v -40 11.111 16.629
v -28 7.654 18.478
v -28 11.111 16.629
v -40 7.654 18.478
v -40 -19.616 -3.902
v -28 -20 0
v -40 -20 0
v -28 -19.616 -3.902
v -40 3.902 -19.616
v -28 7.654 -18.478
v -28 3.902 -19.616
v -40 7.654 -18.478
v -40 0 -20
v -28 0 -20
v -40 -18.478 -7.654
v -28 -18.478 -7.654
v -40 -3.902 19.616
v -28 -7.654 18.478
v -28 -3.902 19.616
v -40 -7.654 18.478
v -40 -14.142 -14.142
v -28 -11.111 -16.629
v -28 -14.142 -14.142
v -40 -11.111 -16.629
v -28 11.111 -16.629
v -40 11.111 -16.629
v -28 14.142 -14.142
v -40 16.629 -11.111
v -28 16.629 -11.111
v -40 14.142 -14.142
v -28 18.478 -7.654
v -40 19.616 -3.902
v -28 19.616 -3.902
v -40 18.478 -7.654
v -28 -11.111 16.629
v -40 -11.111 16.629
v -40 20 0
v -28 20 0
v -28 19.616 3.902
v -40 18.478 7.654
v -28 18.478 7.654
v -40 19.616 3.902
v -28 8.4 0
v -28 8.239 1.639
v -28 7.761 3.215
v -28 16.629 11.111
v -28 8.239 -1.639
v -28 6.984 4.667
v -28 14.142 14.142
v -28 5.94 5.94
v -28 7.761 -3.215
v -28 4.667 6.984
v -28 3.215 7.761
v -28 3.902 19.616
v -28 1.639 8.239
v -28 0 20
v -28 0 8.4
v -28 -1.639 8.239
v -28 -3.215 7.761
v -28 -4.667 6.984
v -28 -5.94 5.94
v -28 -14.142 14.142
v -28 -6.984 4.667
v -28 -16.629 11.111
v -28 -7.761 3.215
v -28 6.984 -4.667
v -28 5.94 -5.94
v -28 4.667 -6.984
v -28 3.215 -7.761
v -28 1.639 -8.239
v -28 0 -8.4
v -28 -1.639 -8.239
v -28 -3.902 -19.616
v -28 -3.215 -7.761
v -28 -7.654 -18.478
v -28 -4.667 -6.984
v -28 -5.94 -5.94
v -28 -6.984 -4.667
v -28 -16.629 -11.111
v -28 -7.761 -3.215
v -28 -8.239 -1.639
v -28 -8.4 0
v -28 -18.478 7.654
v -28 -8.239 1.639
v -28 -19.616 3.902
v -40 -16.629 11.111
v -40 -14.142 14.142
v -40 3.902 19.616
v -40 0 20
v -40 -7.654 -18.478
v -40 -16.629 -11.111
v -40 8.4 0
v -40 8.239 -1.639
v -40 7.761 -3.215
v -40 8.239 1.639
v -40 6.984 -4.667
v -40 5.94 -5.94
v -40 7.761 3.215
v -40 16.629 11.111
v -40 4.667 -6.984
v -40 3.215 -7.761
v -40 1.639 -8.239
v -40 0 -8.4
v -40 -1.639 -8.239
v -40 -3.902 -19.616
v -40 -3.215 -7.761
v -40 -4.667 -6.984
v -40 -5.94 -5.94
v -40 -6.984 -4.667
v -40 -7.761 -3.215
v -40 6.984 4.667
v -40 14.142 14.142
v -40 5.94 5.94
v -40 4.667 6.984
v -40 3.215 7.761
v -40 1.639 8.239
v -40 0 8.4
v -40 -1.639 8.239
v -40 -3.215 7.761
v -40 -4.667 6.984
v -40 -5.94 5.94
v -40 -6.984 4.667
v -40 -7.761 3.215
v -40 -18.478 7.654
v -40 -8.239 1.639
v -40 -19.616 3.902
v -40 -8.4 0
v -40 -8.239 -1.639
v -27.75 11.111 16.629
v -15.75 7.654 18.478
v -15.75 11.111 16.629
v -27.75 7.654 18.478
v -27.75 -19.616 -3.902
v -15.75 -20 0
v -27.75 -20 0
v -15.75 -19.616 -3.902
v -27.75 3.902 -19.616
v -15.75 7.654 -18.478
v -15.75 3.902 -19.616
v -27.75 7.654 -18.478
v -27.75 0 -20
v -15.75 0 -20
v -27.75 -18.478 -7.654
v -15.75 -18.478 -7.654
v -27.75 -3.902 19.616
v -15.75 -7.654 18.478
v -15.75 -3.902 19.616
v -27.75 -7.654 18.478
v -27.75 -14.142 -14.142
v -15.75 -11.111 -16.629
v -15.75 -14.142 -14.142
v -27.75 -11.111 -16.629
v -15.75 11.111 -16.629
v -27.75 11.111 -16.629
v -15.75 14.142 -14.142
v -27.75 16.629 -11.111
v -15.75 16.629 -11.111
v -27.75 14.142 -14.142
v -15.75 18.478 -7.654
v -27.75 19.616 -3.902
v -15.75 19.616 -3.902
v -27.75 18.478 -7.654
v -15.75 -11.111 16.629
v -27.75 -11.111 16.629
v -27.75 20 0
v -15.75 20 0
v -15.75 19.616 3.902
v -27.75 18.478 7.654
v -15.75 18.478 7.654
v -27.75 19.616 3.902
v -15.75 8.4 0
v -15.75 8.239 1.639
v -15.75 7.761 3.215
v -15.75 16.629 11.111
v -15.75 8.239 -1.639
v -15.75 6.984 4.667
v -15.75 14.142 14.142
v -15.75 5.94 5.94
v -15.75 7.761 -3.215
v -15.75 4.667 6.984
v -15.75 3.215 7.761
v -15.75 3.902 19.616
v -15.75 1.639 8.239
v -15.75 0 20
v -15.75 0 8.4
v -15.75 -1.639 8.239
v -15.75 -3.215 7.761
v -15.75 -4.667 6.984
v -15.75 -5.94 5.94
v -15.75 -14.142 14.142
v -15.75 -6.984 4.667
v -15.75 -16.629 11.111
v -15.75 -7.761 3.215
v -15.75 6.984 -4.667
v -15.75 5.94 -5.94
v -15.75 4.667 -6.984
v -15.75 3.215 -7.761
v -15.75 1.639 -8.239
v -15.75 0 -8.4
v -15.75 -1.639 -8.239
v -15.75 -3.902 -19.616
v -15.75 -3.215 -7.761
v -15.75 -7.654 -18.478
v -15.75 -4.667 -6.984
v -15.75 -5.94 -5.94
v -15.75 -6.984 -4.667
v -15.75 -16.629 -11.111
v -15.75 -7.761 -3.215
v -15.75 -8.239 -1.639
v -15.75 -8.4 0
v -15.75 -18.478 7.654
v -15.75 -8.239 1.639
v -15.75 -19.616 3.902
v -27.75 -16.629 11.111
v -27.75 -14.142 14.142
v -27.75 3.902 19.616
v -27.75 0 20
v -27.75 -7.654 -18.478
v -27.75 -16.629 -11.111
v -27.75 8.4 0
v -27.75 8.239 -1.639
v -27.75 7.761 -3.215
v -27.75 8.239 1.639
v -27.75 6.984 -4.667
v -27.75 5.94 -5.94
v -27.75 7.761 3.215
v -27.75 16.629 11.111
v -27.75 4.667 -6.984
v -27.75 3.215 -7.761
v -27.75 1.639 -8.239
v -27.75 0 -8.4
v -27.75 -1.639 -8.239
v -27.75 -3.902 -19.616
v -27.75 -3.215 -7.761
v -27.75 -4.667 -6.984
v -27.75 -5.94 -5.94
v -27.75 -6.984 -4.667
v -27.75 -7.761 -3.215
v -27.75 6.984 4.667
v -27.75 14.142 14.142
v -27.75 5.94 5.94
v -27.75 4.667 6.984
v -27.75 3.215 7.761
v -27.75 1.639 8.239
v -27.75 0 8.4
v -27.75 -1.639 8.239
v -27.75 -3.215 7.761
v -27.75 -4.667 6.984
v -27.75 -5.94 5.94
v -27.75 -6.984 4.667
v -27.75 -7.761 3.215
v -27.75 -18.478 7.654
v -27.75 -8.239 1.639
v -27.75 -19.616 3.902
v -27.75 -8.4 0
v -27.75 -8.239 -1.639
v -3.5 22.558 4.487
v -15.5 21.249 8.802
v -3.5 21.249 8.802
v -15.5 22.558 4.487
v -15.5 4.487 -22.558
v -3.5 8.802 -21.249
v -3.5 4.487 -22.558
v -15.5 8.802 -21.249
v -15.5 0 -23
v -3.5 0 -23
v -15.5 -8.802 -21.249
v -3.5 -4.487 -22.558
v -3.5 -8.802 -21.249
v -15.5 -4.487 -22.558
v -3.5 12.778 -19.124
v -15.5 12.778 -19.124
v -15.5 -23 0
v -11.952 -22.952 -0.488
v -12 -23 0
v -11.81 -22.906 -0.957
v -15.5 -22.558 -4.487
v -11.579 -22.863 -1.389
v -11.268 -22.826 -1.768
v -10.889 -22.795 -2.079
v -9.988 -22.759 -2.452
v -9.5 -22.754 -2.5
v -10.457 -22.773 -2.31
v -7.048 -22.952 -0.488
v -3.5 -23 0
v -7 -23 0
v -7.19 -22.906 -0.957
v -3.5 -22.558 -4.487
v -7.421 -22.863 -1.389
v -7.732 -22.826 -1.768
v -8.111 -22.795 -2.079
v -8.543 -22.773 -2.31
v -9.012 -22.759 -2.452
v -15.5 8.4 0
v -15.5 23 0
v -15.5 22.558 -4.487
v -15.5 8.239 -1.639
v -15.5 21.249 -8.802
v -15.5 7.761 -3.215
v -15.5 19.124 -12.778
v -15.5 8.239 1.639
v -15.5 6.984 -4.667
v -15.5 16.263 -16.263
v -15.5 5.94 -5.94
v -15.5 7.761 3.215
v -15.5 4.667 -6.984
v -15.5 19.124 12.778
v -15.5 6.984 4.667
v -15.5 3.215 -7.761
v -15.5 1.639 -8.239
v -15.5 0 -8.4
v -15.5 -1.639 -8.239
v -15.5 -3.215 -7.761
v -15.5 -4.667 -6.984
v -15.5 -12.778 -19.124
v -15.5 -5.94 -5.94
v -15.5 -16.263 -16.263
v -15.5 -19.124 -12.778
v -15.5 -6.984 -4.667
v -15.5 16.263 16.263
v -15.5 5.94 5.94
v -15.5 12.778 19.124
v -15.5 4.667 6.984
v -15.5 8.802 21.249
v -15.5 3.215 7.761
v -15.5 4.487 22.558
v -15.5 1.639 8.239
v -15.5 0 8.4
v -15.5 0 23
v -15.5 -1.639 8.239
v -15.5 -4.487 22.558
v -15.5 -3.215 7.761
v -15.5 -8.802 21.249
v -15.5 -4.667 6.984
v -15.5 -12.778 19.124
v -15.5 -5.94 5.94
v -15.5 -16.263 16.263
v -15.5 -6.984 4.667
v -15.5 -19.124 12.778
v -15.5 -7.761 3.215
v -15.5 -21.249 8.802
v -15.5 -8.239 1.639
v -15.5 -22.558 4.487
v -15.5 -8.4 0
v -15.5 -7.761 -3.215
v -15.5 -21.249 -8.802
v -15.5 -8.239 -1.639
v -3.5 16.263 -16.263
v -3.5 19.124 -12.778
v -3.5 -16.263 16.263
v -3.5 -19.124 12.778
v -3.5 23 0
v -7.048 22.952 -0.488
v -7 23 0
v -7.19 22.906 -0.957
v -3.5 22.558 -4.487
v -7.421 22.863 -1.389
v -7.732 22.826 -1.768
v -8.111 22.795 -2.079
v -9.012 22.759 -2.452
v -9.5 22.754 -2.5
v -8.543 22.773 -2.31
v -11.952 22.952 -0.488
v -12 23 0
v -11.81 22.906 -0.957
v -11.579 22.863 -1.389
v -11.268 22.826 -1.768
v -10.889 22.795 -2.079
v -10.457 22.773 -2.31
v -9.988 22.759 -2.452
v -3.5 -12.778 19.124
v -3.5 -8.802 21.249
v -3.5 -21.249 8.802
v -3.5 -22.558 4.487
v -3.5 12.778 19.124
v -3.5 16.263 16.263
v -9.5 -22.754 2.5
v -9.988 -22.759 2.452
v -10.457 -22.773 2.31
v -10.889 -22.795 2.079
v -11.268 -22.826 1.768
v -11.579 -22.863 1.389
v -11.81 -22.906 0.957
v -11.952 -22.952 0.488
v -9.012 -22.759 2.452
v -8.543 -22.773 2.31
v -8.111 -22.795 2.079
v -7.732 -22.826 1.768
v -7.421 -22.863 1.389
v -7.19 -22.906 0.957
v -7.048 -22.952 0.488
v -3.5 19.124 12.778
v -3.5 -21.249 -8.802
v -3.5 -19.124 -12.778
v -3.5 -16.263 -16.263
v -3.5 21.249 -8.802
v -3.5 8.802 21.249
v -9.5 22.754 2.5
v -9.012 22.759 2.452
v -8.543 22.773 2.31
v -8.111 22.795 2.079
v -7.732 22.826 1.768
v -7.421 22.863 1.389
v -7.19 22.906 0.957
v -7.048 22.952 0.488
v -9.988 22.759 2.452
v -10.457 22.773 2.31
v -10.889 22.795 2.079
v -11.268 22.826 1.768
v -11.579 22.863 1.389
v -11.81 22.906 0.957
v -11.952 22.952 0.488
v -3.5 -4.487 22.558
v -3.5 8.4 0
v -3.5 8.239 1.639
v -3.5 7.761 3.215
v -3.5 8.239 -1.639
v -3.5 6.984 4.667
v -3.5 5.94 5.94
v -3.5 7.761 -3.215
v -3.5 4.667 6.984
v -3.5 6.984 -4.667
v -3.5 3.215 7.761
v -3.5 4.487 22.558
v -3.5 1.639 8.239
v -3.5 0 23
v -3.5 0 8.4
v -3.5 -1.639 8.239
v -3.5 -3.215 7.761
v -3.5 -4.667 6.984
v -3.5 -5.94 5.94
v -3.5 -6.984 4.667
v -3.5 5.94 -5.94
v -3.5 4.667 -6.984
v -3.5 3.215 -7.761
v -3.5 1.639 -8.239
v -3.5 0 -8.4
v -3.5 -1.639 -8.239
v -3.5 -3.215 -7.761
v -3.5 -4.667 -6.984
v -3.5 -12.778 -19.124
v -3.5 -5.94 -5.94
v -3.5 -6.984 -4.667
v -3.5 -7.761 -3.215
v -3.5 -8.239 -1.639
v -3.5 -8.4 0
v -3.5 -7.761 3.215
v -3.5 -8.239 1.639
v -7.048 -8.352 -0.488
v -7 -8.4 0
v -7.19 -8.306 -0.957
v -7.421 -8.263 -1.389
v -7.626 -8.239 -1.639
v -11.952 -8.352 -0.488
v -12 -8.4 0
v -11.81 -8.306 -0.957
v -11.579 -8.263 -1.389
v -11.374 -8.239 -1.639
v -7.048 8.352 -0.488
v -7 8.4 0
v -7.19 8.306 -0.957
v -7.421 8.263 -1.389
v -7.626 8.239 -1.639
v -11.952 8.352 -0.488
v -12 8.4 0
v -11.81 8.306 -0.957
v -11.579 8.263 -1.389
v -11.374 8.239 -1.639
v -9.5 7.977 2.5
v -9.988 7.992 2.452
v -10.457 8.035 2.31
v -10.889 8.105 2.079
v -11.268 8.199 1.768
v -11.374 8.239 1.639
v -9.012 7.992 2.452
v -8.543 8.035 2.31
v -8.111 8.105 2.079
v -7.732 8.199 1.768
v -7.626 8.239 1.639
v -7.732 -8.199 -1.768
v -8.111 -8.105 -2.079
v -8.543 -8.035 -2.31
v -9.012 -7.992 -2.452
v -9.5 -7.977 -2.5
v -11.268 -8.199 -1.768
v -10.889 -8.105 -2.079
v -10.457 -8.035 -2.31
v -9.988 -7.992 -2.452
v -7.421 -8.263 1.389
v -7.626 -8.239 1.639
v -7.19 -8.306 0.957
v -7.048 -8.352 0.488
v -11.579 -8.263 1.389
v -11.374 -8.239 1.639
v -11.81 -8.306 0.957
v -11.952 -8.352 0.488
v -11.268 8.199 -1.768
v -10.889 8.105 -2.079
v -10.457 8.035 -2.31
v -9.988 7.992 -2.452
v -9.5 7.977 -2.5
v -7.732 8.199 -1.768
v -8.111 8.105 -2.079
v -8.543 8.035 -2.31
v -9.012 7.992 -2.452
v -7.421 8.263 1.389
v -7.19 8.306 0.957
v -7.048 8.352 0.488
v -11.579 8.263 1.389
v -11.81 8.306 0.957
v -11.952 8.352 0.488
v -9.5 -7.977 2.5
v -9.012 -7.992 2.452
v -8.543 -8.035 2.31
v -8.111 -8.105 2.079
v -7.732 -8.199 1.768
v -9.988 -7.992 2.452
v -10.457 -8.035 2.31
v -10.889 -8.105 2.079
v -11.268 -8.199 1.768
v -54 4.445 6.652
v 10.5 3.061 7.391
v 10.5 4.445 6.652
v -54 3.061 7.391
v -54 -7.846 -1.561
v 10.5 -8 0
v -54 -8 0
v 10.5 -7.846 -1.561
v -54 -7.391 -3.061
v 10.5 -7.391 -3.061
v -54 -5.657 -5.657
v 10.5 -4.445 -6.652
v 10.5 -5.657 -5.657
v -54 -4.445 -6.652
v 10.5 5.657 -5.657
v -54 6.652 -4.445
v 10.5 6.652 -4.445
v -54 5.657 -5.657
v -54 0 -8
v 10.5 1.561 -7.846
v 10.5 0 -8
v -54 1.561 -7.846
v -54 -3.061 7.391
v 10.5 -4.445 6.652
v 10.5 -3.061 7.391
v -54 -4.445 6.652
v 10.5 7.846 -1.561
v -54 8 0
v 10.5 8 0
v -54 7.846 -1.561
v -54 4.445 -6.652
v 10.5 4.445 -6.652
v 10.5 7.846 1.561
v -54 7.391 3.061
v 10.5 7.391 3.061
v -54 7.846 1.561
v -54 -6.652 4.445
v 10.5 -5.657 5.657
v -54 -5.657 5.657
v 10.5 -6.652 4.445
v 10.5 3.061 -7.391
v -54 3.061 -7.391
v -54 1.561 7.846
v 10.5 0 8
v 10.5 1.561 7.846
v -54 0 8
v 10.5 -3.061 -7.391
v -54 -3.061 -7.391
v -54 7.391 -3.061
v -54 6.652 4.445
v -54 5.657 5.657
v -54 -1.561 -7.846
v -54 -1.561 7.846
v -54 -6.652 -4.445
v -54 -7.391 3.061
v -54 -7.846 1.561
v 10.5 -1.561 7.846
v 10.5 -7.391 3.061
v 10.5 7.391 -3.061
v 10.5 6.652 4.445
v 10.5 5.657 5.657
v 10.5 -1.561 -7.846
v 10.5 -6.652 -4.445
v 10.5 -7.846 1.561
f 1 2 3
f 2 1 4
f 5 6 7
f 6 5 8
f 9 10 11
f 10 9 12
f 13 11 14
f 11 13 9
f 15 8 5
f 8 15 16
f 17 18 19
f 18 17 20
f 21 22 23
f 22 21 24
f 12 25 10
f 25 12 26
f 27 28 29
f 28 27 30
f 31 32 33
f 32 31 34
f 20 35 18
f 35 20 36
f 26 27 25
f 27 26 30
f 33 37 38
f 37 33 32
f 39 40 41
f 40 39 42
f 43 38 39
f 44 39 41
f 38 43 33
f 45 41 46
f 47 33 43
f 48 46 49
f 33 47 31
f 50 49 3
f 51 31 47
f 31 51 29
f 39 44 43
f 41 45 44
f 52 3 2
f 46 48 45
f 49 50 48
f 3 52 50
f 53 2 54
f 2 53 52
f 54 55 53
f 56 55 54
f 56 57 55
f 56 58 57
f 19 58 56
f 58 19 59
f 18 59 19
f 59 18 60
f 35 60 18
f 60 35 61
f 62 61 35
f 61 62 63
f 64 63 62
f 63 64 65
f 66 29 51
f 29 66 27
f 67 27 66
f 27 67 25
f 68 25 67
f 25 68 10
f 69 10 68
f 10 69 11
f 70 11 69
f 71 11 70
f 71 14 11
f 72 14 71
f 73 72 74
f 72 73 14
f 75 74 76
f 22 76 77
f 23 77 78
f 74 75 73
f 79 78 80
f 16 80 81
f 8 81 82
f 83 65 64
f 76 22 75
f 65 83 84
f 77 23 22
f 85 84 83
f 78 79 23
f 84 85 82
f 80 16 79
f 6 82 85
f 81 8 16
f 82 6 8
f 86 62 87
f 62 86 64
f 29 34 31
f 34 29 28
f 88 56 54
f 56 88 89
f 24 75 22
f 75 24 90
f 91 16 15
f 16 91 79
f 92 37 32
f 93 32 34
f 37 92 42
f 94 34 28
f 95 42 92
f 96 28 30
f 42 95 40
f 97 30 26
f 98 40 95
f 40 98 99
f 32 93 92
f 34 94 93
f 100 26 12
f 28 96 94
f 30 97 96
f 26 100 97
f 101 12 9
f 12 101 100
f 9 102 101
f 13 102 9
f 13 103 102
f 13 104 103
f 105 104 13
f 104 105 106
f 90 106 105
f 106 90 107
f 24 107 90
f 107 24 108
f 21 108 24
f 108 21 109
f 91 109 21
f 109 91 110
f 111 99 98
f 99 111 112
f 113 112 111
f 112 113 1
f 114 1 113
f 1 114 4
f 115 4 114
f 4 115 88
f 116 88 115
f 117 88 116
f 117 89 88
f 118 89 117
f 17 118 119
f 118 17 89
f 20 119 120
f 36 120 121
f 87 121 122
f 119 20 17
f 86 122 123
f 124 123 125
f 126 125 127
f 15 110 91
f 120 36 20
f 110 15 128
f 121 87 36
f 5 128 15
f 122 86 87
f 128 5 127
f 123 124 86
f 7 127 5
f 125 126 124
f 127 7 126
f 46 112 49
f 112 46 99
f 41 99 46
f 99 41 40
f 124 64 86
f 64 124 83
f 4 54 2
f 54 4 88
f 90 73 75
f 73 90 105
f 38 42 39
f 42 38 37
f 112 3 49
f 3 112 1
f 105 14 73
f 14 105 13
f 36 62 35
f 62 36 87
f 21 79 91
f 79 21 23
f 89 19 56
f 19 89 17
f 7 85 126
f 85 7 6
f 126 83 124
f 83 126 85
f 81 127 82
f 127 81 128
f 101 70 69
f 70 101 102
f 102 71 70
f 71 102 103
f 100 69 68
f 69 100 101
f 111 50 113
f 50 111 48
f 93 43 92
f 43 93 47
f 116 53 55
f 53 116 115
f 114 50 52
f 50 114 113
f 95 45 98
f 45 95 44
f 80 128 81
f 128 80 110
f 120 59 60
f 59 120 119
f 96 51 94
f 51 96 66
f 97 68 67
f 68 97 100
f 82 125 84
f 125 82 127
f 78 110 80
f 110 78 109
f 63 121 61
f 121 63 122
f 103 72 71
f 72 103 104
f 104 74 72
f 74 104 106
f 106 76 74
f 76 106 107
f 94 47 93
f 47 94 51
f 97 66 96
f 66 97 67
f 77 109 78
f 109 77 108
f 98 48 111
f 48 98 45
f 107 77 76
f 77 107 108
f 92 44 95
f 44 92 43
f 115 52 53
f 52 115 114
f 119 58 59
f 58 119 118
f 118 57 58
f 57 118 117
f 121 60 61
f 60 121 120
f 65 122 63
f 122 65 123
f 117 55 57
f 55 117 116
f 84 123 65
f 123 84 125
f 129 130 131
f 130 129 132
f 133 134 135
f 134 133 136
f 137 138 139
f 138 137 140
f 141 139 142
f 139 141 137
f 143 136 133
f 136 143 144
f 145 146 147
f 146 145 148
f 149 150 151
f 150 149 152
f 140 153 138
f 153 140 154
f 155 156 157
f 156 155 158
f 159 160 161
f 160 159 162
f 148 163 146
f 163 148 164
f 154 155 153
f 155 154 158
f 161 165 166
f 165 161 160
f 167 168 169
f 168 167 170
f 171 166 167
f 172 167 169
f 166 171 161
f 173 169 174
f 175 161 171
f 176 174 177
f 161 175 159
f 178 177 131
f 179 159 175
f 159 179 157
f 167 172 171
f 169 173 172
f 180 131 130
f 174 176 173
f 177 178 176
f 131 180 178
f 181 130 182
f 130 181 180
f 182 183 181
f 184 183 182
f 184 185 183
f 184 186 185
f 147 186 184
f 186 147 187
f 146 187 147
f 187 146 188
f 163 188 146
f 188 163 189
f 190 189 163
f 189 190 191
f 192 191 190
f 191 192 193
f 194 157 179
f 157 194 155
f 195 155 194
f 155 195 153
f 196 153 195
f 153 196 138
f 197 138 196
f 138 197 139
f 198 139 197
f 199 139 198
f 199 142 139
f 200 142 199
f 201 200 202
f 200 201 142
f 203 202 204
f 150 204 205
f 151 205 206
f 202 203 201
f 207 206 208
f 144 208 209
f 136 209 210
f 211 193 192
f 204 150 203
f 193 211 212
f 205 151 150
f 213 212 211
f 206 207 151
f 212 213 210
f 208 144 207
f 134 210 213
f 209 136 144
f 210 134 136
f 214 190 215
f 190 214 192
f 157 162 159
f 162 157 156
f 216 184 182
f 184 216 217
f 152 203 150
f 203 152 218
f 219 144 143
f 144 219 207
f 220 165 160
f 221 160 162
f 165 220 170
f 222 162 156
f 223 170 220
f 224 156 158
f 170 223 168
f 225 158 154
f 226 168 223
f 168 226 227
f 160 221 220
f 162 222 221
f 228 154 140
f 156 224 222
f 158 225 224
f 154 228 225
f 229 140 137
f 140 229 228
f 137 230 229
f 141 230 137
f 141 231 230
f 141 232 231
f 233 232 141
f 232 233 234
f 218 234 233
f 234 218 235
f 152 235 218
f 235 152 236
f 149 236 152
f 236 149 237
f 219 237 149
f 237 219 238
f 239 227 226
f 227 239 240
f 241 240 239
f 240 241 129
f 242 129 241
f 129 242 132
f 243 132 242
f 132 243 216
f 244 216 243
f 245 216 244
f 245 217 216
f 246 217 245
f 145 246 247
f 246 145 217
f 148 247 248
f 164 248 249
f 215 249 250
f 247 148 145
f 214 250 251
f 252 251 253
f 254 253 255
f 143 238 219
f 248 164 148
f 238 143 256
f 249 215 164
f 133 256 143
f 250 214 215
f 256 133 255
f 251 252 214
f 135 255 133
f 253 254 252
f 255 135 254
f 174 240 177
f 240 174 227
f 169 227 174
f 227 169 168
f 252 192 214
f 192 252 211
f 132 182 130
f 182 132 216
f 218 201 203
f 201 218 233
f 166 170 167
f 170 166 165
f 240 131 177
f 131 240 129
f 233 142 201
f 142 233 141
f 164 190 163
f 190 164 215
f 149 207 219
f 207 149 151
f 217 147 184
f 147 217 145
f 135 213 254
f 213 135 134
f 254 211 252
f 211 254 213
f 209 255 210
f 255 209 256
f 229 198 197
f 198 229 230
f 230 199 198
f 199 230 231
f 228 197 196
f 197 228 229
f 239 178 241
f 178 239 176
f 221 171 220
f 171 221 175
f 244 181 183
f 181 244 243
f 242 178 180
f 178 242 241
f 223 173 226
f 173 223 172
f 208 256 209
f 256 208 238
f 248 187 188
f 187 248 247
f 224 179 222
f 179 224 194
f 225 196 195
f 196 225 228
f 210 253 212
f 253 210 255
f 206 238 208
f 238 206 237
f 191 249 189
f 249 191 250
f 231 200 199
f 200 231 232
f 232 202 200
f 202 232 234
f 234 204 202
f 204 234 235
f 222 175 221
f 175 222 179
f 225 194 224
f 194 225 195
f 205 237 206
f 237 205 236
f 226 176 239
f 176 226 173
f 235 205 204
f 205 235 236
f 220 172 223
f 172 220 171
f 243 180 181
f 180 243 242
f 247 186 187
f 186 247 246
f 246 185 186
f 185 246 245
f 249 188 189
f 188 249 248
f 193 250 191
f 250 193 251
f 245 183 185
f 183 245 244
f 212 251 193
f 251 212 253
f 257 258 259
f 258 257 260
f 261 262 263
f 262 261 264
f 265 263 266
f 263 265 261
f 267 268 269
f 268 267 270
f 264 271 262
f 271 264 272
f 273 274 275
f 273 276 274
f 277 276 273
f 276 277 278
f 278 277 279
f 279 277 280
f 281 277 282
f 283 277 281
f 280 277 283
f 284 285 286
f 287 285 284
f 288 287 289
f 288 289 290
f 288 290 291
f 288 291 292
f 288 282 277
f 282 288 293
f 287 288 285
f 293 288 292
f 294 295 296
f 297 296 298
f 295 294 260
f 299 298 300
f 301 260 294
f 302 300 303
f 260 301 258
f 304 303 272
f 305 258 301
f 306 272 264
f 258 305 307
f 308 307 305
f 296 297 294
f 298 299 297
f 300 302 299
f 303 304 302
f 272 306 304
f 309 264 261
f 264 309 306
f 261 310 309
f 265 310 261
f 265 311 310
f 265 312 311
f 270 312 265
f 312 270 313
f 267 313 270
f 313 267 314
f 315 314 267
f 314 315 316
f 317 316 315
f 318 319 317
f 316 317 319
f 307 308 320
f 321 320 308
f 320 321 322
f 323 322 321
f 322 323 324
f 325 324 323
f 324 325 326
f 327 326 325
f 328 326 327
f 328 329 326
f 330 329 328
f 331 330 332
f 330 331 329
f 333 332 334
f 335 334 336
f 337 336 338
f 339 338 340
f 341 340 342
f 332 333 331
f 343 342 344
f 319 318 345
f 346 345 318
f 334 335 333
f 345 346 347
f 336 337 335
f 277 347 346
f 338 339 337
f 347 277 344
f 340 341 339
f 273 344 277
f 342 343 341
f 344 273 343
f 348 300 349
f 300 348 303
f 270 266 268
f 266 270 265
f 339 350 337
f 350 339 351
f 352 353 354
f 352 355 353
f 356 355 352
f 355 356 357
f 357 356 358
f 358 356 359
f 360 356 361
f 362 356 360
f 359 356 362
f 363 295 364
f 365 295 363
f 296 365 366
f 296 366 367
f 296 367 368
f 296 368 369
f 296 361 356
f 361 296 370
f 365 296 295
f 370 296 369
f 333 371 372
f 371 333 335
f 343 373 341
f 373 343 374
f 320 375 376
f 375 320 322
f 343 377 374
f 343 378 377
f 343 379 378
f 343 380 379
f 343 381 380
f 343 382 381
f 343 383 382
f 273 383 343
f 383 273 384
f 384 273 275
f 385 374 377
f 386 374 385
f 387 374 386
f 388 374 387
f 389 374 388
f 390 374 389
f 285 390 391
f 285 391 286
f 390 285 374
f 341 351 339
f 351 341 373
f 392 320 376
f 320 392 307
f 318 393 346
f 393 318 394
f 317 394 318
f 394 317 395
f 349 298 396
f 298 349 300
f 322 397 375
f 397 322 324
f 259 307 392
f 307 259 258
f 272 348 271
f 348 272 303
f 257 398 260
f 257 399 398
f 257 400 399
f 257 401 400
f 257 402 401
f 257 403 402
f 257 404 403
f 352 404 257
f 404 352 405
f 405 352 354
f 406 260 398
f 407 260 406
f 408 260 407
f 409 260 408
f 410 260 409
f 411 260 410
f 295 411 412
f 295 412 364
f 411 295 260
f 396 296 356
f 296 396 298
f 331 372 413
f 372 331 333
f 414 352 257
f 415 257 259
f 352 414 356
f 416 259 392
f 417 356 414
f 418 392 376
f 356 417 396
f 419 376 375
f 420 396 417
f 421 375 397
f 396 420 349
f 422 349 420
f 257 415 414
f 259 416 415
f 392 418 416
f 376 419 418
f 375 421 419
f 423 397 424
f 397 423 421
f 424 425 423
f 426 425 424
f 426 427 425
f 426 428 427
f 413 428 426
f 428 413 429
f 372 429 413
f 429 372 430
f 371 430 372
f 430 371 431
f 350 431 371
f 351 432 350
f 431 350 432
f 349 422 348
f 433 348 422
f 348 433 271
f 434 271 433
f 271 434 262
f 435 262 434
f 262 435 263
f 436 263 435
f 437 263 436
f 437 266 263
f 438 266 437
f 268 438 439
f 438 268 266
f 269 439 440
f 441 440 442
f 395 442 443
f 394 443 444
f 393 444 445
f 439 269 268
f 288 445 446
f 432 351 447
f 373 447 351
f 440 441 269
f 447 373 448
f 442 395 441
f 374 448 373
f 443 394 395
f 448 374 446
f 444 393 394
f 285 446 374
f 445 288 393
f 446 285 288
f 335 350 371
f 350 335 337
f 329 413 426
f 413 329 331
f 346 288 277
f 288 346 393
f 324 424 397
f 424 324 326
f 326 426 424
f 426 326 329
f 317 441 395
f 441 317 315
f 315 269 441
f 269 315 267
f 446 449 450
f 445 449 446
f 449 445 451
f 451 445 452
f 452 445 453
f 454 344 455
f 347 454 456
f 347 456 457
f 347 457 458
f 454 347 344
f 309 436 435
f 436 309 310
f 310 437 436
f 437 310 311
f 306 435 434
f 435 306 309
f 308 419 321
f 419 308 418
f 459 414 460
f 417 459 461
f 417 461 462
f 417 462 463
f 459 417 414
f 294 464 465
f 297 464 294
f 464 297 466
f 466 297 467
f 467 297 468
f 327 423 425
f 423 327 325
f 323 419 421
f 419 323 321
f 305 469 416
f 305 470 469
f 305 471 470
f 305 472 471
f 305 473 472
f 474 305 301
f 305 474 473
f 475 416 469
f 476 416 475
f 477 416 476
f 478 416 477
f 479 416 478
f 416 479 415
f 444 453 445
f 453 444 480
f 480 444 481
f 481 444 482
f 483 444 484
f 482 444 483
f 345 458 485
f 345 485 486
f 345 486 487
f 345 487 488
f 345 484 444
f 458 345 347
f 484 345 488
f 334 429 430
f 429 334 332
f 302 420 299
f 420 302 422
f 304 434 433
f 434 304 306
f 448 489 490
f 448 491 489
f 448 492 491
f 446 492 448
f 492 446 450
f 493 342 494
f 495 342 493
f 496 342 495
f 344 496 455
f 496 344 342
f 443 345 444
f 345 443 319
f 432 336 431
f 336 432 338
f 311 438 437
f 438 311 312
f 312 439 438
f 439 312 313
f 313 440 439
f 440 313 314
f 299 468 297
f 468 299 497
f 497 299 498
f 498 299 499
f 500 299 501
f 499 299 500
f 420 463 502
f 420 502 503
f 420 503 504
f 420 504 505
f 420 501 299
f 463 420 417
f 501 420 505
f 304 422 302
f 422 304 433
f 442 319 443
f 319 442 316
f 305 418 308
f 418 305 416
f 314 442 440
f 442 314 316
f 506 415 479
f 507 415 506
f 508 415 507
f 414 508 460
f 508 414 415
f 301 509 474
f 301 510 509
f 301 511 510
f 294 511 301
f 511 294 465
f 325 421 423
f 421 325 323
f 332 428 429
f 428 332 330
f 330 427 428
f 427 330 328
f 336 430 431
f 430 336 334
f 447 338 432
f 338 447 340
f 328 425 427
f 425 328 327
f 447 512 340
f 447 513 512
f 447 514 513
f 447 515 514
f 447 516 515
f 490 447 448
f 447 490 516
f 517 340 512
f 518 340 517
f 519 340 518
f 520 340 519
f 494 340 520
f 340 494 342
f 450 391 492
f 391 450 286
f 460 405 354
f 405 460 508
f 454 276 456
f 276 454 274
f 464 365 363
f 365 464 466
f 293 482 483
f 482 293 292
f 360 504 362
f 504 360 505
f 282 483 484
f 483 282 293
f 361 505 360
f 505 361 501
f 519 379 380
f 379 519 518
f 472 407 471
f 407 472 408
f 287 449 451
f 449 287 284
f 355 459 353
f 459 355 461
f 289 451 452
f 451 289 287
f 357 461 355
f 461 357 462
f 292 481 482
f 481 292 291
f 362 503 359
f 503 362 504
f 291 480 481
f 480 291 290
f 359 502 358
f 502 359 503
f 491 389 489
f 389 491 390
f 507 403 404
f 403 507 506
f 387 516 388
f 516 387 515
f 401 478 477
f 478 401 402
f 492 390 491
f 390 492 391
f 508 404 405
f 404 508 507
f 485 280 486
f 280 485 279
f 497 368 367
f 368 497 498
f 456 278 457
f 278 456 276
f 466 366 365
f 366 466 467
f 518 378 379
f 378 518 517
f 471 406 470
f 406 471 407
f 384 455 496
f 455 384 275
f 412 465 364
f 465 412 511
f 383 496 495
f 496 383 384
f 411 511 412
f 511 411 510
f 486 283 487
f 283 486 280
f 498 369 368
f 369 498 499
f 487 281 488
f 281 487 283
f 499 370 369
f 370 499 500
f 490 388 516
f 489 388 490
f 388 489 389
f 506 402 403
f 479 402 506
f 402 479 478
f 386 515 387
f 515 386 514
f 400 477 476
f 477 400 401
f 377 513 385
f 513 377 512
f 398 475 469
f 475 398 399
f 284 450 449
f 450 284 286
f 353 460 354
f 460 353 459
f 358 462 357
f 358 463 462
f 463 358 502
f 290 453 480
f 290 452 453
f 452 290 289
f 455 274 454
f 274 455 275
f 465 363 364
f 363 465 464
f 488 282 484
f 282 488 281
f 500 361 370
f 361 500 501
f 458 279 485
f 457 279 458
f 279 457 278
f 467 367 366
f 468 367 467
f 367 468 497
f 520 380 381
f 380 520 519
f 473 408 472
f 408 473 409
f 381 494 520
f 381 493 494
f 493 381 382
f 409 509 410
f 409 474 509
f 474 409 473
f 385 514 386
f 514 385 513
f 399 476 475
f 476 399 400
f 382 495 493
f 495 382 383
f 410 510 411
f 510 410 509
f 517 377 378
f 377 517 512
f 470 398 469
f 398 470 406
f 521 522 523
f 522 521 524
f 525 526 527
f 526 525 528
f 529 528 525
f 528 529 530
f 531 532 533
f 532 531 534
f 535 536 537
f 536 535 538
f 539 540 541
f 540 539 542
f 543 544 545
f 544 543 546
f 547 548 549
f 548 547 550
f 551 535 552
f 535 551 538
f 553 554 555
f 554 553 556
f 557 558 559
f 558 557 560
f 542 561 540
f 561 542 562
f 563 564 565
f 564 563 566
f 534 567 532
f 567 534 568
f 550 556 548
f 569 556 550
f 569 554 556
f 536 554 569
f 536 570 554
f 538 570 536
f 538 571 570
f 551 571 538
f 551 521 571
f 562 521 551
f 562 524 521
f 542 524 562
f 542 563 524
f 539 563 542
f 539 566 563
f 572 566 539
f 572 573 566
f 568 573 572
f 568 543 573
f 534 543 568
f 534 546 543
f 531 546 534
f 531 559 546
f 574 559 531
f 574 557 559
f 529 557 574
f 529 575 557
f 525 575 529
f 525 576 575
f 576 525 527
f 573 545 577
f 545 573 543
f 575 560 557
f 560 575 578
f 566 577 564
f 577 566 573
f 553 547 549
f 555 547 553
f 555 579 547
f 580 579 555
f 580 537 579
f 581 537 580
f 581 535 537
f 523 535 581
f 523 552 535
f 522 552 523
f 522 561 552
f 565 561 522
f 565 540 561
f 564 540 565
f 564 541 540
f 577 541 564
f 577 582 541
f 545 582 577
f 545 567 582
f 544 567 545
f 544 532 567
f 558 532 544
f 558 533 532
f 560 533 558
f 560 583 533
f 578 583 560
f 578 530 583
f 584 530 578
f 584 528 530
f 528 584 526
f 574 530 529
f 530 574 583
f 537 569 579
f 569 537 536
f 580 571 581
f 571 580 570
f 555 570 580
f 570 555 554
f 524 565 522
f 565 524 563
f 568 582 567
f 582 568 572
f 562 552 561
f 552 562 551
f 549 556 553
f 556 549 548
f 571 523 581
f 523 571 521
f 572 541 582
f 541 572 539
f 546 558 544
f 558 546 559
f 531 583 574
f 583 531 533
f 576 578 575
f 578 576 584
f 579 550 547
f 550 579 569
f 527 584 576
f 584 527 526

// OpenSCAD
$fn = 32;

// ------------------------------------------------------------------------
// Shaft with rings and collars: d16 shaft, 3 rings
// Every part is its own module, assembly() places them once.
// ------------------------------------------------------------------------

// --- part 1 ---
module shaft() {
  translate([0, 0, -32.25]) cylinder(h = 64.5, d = 16);
}

// --- part 2 ---
module spacer_a() {
  difference() {
      translate([0, 0, 0]) cylinder(h = 12, d = 40);
      translate([0, 0, -1]) cylinder(h = 14, d = 16.8);
    }
}

// --- part 3 ---
module spacer_b() {
  difference() {
      translate([0, 0, 0]) cylinder(h = 12, d = 40);
      translate([0, 0, -1]) cylinder(h = 14, d = 16.8);
    }
}

// --- part 4 ---
module collar_a() {
  difference() {
    cylinder(h = 12, d = 46);
    translate([0, 0, -1]) cylinder(h = 14, d = 16.8);
    translate([0, 0, 6]) rotate([90, 0, 0]) cylinder(h = 48, d = 5, center = true);
  }
}

// --- assembly ---
module assembly() {
  translate([-21.75, 0, 0]) rotate([0, 90, 0]) shaft();
  translate([-40, 0, 0]) rotate([0, 90, 0]) spacer_a();
  translate([-27.75, 0, 0]) rotate([0, 90, 0]) spacer_b();
  translate([-15.5, 0, 0]) rotate([0, 90, 0]) collar_a();
}

assembly();
